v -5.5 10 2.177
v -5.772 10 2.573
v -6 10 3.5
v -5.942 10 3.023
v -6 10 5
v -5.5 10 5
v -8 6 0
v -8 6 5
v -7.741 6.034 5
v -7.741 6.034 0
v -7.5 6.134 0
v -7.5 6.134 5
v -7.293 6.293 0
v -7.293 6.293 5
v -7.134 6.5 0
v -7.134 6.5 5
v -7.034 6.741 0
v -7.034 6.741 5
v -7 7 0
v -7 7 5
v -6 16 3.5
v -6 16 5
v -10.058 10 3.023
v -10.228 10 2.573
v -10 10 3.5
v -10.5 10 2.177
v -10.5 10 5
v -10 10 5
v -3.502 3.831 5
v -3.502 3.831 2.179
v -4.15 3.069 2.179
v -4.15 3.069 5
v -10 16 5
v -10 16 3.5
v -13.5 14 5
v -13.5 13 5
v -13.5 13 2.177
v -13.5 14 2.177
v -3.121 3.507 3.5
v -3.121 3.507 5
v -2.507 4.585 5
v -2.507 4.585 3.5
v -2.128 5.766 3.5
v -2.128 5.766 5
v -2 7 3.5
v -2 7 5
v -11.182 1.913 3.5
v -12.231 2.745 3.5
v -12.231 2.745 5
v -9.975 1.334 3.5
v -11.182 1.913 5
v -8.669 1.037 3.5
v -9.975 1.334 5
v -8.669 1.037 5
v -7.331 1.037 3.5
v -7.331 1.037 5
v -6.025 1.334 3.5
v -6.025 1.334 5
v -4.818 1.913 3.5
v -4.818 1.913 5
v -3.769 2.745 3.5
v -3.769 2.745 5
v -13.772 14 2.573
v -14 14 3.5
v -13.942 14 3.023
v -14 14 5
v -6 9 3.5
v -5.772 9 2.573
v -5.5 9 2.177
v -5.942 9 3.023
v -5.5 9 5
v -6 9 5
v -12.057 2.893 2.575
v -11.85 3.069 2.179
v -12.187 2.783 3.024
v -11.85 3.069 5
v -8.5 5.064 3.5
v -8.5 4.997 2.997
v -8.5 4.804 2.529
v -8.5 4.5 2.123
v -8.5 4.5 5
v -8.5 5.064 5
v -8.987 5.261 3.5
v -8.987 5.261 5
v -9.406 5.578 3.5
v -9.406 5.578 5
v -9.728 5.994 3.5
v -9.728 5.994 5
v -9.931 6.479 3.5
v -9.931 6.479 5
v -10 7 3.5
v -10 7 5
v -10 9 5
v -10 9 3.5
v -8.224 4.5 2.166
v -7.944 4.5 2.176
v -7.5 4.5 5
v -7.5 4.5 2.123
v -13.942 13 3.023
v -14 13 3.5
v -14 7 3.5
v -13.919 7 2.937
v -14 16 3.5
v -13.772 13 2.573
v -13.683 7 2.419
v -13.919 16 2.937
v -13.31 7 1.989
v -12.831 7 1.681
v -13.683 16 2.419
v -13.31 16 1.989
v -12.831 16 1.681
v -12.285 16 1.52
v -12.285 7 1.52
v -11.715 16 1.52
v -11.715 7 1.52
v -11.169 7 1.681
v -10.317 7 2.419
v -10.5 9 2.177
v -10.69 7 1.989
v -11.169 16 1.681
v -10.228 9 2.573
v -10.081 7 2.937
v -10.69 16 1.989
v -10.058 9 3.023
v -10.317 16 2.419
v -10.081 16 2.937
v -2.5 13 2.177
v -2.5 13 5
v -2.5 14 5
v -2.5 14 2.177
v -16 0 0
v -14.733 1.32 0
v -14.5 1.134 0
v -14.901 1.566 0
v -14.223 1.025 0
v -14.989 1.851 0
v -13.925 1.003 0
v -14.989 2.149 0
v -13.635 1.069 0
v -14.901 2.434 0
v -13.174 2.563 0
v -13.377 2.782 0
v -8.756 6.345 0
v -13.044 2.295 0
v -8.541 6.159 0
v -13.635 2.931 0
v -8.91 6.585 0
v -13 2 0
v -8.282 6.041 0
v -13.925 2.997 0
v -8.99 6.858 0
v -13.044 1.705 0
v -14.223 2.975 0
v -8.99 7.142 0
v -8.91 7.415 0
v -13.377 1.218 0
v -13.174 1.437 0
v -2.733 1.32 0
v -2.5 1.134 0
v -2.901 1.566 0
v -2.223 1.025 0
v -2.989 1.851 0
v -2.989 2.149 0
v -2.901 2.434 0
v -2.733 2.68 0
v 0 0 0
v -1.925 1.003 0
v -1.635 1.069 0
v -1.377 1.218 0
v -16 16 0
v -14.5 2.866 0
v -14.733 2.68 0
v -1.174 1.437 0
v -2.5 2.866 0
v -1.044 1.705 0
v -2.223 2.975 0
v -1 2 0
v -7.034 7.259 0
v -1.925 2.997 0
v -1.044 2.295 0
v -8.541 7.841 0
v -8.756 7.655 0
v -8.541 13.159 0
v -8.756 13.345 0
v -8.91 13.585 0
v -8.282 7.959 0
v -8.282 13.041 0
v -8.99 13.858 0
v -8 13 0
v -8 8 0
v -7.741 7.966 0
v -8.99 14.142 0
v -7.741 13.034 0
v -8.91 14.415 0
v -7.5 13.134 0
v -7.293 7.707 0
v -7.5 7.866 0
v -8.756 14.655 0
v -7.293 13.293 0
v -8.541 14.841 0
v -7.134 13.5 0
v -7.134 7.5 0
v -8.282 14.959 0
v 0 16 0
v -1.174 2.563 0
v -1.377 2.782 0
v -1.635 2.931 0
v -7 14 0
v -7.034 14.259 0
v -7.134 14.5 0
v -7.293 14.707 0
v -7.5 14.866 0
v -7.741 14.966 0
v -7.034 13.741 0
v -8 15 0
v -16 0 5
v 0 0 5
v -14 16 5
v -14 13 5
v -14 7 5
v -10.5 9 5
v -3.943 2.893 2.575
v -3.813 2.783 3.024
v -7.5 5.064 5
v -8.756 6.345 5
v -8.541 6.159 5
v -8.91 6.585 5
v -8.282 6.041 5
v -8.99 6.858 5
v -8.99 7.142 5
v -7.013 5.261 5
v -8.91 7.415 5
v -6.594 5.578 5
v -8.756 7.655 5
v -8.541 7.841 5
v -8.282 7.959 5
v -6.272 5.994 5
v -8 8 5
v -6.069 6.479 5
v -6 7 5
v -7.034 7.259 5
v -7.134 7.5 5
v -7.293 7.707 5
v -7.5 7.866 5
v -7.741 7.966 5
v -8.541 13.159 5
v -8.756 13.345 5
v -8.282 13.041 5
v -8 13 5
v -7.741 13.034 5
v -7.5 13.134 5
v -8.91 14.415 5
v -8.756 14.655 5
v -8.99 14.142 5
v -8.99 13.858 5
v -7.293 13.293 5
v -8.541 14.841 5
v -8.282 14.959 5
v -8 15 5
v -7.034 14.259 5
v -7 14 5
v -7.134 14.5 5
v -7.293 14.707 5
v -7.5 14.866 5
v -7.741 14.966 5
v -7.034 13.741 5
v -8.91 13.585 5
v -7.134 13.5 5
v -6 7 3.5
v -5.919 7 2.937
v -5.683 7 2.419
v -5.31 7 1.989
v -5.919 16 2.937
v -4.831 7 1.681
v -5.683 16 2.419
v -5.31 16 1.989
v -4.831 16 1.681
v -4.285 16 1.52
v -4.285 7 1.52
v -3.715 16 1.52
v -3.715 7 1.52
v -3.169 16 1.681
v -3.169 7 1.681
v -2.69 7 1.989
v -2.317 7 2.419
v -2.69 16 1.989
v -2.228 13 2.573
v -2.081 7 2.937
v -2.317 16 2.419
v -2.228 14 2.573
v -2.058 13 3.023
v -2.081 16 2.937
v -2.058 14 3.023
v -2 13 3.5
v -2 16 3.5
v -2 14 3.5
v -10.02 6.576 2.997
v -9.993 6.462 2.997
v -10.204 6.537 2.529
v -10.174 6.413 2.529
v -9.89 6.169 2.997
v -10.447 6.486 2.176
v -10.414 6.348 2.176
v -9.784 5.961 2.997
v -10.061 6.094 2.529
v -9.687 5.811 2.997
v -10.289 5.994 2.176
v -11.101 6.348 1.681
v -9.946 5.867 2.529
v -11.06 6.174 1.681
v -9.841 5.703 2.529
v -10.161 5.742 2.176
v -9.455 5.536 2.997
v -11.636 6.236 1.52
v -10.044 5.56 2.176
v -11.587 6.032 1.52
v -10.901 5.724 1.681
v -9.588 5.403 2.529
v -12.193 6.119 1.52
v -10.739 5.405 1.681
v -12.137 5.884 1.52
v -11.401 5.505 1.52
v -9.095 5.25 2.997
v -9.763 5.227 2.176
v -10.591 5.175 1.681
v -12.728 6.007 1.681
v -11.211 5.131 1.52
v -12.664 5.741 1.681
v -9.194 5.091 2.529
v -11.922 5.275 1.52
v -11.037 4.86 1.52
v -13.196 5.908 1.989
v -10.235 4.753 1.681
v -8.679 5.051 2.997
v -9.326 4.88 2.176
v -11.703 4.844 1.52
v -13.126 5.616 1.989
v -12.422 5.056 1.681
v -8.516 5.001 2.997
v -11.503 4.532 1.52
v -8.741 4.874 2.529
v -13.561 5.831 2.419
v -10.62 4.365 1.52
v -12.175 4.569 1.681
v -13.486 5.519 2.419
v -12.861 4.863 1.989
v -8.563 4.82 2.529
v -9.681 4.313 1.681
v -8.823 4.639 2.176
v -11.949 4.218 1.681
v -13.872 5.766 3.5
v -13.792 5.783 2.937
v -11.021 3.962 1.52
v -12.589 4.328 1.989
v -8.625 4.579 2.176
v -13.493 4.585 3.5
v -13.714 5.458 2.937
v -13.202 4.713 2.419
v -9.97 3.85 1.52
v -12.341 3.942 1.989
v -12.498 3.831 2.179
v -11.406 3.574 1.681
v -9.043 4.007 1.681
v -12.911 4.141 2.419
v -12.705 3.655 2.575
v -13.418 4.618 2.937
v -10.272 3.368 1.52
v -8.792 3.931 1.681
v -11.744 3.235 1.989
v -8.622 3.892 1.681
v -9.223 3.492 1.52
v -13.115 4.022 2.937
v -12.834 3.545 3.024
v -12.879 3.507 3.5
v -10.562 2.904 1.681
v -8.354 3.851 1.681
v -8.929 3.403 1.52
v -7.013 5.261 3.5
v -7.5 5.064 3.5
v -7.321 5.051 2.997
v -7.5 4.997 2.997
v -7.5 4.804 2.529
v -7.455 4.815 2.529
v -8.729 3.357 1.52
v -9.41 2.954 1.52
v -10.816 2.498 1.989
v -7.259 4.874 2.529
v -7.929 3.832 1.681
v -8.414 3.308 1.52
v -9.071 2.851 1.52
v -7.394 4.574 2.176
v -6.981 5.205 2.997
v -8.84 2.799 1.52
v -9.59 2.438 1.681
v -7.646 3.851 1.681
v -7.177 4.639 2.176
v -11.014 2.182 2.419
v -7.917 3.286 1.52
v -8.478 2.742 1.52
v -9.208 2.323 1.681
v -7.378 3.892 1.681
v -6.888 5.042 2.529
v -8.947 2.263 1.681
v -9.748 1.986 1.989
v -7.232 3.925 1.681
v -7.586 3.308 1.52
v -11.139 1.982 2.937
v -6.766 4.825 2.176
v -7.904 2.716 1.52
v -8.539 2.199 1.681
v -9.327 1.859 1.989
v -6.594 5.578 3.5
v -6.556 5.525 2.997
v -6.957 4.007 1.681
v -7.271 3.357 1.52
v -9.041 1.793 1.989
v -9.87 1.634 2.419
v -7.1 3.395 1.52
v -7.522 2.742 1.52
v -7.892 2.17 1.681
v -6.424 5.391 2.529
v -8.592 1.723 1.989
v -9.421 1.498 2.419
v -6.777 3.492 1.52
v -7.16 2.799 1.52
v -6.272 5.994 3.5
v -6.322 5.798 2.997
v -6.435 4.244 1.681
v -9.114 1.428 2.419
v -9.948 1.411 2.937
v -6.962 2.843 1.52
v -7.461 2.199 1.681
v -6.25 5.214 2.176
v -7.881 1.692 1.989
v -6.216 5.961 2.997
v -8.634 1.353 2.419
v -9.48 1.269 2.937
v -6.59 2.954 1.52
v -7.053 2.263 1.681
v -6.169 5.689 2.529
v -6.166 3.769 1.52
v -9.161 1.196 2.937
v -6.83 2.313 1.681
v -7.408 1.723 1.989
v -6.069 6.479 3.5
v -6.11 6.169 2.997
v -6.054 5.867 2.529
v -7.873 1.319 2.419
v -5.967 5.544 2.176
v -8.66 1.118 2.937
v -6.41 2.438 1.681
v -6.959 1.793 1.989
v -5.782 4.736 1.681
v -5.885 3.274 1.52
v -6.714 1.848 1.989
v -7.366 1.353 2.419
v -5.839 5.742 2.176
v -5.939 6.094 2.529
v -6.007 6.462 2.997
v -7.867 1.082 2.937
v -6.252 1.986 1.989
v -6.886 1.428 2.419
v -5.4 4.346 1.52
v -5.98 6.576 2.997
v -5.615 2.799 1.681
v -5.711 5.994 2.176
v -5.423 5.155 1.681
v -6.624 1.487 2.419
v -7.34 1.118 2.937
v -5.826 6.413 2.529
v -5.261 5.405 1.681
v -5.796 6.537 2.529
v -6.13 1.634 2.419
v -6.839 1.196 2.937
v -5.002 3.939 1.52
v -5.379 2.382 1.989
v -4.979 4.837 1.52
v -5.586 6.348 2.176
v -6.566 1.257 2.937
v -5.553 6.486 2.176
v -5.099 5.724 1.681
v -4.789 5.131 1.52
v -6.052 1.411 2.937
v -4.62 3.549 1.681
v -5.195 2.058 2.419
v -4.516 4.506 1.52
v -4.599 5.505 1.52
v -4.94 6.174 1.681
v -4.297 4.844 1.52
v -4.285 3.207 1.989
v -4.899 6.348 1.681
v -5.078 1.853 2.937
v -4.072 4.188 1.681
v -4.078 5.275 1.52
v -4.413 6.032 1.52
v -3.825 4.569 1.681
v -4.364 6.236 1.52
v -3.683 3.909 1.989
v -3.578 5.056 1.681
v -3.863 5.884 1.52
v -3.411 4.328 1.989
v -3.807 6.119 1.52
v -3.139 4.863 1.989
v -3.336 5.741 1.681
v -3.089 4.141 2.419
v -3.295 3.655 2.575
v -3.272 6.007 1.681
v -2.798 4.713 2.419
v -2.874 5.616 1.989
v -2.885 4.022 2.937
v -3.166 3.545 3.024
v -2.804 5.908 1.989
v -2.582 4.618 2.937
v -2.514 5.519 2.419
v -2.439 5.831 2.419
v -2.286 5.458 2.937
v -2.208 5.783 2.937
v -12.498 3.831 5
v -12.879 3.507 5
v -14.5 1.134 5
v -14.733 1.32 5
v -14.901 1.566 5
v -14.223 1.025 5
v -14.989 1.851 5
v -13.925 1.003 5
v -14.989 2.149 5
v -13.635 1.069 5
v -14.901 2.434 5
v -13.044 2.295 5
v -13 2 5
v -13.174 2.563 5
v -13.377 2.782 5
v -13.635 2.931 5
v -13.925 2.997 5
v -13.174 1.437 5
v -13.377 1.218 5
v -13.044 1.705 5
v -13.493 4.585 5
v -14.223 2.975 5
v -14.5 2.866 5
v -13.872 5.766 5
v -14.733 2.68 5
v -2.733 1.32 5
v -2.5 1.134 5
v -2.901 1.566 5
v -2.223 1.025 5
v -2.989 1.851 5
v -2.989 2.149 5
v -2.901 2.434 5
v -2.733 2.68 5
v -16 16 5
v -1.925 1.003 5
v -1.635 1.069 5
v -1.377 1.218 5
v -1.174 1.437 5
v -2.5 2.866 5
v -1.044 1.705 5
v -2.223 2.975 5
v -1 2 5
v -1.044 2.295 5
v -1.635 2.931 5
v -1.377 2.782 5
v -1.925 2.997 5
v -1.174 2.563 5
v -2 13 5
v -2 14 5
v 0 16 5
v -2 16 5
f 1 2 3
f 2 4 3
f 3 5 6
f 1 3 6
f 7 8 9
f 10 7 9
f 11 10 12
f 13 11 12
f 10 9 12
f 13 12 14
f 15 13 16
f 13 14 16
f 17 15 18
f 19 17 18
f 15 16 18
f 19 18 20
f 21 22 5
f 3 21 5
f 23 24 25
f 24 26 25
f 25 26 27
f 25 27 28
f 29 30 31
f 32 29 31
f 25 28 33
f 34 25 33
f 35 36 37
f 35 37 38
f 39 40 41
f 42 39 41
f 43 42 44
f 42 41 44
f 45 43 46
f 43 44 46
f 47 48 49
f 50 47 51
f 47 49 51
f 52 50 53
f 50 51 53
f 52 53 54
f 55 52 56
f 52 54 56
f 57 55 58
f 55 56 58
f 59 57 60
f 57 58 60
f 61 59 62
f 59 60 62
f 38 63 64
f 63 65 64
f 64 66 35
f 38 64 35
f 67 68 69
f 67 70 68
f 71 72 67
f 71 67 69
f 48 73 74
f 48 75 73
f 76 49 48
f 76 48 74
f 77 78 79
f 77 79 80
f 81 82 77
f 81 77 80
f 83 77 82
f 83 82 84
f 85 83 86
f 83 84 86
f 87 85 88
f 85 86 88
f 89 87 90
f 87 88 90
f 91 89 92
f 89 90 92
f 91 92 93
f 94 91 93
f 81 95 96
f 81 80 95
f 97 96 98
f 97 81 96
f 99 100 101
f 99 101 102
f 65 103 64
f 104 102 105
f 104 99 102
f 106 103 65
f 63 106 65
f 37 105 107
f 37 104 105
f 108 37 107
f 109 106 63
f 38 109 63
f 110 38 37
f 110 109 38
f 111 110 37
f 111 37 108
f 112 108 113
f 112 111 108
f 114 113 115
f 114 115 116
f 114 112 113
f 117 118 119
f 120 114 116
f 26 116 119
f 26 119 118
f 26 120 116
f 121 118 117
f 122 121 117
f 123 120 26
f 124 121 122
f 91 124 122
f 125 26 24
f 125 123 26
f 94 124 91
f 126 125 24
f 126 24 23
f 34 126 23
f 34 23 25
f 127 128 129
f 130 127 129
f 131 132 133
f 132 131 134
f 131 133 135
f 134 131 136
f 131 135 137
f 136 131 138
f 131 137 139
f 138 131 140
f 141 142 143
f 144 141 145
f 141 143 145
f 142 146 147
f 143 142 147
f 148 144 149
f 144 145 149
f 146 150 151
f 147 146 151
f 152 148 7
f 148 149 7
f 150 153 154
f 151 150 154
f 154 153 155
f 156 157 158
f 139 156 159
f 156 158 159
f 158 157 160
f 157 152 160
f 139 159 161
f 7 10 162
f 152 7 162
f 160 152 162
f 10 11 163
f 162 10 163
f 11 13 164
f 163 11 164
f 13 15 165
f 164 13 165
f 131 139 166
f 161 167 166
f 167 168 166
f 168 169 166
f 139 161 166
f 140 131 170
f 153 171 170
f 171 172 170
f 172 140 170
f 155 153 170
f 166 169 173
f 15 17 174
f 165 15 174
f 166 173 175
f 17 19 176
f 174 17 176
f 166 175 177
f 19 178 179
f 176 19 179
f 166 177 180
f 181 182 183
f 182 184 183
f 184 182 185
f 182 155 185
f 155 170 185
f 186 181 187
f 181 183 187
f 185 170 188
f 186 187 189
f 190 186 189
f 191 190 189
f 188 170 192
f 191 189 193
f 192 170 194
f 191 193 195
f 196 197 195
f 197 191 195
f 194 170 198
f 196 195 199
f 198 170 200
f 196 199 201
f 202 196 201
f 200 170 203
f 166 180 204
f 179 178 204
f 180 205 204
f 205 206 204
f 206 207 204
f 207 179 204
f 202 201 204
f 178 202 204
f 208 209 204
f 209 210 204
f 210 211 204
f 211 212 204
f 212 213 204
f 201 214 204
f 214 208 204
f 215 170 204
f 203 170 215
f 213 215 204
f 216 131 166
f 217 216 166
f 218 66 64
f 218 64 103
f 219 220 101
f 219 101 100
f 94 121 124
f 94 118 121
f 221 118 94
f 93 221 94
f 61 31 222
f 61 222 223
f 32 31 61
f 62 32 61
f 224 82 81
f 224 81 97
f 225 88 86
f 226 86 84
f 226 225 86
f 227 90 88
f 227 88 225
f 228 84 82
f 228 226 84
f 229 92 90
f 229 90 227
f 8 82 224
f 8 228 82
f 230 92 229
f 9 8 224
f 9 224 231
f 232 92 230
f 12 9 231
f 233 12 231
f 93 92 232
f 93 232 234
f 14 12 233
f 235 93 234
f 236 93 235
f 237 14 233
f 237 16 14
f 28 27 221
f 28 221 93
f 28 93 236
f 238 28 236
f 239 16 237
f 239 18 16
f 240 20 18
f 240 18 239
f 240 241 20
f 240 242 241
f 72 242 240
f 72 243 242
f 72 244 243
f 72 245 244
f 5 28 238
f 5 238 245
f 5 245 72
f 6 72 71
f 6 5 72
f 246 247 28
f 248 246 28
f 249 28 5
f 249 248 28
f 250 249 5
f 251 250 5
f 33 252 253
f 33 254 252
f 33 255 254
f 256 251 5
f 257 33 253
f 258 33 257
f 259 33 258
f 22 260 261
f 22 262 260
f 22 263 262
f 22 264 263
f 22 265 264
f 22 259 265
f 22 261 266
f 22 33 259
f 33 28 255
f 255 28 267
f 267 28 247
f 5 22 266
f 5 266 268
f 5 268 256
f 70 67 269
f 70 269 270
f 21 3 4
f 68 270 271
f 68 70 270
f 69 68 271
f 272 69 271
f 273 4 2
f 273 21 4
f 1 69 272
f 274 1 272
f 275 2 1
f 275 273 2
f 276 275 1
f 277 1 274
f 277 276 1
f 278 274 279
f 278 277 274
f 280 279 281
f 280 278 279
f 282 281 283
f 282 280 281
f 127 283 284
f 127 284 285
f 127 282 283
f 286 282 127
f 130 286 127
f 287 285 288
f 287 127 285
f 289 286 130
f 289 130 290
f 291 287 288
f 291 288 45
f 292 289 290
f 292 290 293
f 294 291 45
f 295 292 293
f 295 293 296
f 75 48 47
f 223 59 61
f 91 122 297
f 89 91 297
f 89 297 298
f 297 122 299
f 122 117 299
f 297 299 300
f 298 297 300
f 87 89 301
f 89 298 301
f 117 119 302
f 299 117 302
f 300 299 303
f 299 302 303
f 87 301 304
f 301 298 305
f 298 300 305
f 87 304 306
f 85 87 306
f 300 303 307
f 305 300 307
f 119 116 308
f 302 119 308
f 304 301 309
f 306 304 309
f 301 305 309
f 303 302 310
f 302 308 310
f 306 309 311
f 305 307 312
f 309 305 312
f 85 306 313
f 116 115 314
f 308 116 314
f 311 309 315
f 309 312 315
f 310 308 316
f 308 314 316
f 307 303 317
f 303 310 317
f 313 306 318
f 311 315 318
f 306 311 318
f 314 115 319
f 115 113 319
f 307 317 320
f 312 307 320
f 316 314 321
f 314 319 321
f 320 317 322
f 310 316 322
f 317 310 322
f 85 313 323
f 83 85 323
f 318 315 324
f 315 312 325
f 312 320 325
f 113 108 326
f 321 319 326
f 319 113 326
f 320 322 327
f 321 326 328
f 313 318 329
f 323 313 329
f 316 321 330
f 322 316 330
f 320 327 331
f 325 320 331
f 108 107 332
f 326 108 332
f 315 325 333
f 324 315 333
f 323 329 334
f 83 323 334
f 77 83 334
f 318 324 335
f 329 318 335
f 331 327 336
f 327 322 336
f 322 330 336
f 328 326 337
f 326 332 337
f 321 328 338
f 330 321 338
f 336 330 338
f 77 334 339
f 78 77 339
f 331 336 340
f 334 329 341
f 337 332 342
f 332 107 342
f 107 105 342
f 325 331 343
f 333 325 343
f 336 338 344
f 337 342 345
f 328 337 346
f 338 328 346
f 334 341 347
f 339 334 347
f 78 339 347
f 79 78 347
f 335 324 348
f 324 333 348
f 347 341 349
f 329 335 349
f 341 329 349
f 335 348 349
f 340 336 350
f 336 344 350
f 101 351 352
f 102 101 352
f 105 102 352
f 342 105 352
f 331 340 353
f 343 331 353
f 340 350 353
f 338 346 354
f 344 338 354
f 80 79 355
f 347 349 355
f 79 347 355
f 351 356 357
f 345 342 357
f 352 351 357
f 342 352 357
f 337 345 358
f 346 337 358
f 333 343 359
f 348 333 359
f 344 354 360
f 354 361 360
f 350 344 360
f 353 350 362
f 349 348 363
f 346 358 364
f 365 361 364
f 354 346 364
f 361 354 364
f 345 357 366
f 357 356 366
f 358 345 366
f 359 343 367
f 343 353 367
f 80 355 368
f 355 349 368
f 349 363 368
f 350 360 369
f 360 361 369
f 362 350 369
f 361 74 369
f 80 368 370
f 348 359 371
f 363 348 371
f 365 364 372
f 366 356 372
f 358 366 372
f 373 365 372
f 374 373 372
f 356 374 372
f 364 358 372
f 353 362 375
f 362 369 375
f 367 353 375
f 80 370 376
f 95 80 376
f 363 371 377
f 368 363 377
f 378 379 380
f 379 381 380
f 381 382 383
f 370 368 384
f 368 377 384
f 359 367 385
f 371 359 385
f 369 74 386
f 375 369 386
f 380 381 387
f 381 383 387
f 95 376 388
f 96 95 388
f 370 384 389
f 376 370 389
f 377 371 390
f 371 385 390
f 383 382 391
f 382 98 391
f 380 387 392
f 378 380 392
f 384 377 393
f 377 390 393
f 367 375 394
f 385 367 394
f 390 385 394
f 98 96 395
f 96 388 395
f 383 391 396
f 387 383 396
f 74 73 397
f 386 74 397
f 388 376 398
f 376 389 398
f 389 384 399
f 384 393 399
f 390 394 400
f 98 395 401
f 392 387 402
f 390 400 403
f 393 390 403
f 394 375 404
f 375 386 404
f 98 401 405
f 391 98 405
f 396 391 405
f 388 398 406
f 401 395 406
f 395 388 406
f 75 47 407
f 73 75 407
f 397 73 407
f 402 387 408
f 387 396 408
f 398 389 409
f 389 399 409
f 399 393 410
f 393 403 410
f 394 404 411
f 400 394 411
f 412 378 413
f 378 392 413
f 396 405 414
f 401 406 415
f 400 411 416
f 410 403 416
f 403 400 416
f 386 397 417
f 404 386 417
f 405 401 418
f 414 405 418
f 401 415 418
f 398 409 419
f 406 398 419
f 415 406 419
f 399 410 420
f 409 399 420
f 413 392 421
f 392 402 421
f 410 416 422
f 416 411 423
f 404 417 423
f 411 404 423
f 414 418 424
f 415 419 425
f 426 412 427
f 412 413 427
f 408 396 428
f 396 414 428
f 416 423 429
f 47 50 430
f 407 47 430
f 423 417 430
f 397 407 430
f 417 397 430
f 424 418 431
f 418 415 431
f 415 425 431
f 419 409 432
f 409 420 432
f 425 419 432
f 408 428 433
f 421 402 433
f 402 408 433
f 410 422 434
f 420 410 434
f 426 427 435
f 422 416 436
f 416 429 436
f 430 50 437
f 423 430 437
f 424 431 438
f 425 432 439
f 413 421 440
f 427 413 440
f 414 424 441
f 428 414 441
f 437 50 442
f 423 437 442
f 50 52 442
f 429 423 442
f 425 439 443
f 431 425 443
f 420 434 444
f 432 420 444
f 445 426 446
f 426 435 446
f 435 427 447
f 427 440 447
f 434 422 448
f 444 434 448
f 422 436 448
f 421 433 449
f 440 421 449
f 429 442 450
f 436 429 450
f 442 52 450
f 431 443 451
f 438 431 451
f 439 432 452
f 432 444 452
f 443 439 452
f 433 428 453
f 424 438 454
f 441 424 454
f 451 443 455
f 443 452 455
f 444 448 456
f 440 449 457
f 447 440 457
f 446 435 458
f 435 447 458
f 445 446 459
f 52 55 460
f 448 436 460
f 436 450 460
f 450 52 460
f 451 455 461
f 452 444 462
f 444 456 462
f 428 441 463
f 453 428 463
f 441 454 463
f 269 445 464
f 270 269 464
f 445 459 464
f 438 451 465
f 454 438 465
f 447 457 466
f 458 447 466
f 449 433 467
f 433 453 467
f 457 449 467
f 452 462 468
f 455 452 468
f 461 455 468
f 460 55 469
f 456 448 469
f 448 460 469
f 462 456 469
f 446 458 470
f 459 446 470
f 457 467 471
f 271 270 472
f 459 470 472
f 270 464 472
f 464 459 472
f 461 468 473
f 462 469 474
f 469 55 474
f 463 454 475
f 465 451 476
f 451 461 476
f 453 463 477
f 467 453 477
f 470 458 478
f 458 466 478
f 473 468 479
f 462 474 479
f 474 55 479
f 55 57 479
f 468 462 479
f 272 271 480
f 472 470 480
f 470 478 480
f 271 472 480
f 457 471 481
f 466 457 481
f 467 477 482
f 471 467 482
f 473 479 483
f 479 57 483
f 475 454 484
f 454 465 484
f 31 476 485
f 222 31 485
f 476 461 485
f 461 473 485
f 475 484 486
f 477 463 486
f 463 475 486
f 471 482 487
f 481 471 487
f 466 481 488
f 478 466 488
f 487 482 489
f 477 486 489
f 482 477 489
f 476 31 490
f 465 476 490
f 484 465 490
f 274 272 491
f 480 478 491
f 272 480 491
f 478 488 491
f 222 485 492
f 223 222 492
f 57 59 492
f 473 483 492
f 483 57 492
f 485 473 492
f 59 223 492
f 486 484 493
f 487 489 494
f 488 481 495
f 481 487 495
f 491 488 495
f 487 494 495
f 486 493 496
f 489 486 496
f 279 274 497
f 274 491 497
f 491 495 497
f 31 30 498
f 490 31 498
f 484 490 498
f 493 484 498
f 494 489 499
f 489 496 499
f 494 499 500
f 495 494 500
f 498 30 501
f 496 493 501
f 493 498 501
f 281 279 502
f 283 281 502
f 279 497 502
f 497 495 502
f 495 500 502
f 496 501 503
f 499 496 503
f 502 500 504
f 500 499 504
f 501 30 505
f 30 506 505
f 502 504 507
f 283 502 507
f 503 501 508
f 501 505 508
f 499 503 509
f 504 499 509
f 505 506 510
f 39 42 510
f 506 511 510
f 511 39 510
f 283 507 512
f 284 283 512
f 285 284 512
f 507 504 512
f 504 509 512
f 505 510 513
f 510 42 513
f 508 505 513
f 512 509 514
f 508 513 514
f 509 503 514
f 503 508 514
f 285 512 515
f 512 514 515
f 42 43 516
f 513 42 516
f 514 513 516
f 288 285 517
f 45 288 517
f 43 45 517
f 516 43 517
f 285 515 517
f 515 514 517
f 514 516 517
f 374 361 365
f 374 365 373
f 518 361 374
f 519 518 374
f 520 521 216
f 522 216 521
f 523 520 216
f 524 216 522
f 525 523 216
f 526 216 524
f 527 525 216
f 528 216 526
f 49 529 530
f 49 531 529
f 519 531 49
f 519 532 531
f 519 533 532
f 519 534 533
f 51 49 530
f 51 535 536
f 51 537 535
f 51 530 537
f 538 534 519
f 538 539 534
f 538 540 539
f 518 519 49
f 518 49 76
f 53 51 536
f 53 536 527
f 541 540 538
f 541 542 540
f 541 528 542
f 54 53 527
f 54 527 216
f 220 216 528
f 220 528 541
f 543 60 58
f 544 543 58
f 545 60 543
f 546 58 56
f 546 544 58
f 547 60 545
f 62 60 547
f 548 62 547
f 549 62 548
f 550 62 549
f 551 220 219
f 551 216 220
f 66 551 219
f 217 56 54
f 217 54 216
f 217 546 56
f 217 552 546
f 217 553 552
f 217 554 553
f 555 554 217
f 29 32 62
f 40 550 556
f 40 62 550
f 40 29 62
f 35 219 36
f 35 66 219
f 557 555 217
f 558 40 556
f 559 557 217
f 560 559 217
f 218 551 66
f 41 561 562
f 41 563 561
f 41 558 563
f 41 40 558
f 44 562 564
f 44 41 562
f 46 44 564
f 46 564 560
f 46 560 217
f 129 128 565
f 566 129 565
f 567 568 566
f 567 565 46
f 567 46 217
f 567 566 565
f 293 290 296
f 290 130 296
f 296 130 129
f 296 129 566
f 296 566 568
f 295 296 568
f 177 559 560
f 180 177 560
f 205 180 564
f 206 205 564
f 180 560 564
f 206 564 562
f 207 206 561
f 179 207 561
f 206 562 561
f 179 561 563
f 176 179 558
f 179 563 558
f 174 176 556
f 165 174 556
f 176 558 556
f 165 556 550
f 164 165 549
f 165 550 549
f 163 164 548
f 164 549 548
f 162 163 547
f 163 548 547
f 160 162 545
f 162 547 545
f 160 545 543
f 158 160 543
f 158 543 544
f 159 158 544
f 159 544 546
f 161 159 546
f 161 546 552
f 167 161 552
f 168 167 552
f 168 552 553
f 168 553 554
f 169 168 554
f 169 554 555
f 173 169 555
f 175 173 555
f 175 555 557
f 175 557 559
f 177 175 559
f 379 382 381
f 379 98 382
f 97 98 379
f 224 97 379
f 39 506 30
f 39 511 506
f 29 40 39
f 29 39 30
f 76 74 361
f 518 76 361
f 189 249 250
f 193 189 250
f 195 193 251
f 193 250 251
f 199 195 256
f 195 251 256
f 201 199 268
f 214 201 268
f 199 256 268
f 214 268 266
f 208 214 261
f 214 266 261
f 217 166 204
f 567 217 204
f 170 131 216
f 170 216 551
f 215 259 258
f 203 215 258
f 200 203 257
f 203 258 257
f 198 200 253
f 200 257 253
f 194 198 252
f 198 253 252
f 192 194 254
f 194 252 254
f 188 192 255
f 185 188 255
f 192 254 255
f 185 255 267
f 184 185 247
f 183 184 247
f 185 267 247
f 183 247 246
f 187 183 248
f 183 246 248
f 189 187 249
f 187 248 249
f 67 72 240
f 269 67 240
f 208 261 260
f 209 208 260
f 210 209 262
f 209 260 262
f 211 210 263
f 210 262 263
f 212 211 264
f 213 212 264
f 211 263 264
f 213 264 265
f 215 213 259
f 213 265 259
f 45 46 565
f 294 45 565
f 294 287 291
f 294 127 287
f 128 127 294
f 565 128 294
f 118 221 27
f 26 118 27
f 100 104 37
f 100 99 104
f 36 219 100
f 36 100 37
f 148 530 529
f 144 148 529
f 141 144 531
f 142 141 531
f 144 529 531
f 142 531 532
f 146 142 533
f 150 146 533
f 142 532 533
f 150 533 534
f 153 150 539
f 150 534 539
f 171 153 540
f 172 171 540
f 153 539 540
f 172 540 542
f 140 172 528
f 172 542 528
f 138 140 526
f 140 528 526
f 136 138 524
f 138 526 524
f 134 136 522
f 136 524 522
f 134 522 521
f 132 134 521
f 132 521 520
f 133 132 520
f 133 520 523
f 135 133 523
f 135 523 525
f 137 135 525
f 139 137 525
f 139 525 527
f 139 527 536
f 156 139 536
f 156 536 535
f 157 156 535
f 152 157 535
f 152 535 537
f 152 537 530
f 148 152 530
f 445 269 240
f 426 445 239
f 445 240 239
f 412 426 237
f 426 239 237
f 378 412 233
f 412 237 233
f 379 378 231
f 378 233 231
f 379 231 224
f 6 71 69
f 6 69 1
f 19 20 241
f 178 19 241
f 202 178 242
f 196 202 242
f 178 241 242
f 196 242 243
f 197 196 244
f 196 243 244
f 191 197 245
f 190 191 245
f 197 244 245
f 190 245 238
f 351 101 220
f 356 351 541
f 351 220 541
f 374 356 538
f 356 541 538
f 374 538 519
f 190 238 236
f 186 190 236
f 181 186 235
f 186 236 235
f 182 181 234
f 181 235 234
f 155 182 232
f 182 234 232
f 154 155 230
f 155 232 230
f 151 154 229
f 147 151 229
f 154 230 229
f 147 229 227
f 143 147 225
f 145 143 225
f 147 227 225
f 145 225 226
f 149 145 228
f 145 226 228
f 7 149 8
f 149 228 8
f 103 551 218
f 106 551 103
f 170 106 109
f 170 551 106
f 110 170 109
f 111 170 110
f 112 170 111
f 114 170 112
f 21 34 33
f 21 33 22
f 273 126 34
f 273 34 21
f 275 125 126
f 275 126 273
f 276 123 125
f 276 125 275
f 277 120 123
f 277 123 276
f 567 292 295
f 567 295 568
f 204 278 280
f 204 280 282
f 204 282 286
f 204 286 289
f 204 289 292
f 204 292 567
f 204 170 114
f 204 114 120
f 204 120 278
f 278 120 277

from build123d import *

# Parameters (mm, degrees)
F0_W      = 16
F0_H      = 16
F1_DEPTH  = 5
F2_W      = 2
F2_H      = 9
F3_DEPTH  = 1.5
F4_W      = 2
F4_H      = 9
F8_W      = 0.5
F8_H      = 1
F8_H_2    = 0.5
F9_DEPTH  = 5
F10_R     = 1
F11_DEPTH = 25


# Not quite as in the source:
# - a feature names something its author has since deleted; it is built from what else it names


with BuildPart() as f1:
    # F0 (on Top) → F1 (new body)
    with BuildSketch(Plane.XY):
        with Locations((-8, 8)):
            Rectangle(F0_W, F0_H)
    extrude(amount=F1_DEPTH)

    # F2 (on face) → F3 (cut)
    with BuildSketch(Plane.XY.offset(5)):
        with Locations((-13, 11.5)):
            Rectangle(F2_W, F2_H)
        with BuildLine():
            Line((-12, 7), (-14, 7))
            ThreePointArc((-14, 7), (-8, 1), (-2, 7))
            Line((-2, 7), (-4, 7))
            ThreePointArc((-4, 7), (-8, 3), (-12, 7))
        make_face()
        with BuildLine():
            Line((-10, 16), (-12, 16))
            Line((-12, 16), (-12, 7))
            ThreePointArc((-12, 7), (-8, 3), (-4, 7))
            Line((-4, 7), (-4, 16))
            Line((-4, 16), (-6, 16))
            Line((-6, 16), (-6, 7))
            ThreePointArc((-6, 7), (-8, 5), (-10, 7))
            Line((-10, 7), (-10, 16))
        make_face()
        with Locations((-3, 11.5)):
            Rectangle(F2_W, F2_H)
    extrude(amount=-F3_DEPTH, mode=Mode.SUBTRACT)

    # F4 (on face) → F5 (revolve, cut)
    with BuildSketch(Plane.XY.offset(3.5)):
        with Locations((-13, 11.5)):
            Rectangle(F4_W, F4_H)
    revolve(axis=Axis((-12, 11.5, 3.5), (0, -1, 0)), mode=Mode.SUBTRACT)

    # F6: sweep along a path in F6_path
    with BuildLine(Plane(origin=(-10, 7, 3.5), x_dir=(0, -1, 0), z_dir=(0, 0, -1))) as f6_path:
        ThreePointArc((0, 0), (2, -2), (0, -4))
    # F5_face (on face) → F6 (sweep, cut)
    with BuildSketch(Plane(origin=(-12, 7, 2.6511736368), x_dir=(-1, 0, 0), z_dir=(0, 1, 0))):
        with BuildLine():
            Line((2, 0.8488263632), (-2, 0.8488263632))
            ThreePointArc((-2, 0.8488263632), (0, -1.1511736368), (2, 0.8488263632))
        make_face()
    sweep(path=f6_path.line, mode=Mode.SUBTRACT)

    # F4 (on face) → F7 (revolve, cut)
    with BuildSketch(Plane.XY.offset(3.5)):
        with Locations((-3, 11.5)):
            Rectangle(F4_W, F4_H)
    revolve(axis=Axis((-4, 11.5, 3.5), (0, -1, 0)), mode=Mode.SUBTRACT)

    # F8 (on face) → F9 (join)
    with BuildSketch(Plane.XY.offset(5)):
        with Locations((-13.75, 13.5)):
            Rectangle(F8_W, F8_H)
        with Locations((-10.25, 9.5)):
            Rectangle(F8_W, F8_H)
        with Locations((-5.75, 9.5)):
            Rectangle(F8_W, F8_H)
        with Locations((-2.25, 13.5)):
            Rectangle(F8_W, F8_H)
        with BuildLine():
            Line((-12.4976444751, 3.8310784478), (-12.8785175711, 3.5071406687))
            ThreePointArc((-12.8785175711, 3.5071406687), (-12.570477152, 3.1127466505), (-12.2306420128, 2.7453944767))
            Line((-12.2306420128, 2.7453944767), (-11.8497689168, 3.0693322558))
            Line((-11.8497689168, 3.0693322558), (-12.4976444751, 3.8310784478))
        make_face()
        with BuildLine():
            ThreePointArc((-3.7693579872, 2.7453944767), (-3.429522848, 3.1127466505), (-3.1214824289, 3.5071406687))
            Line((-3.1214824289, 3.5071406687), (-3.5023555249, 3.8310784478))
            Line((-3.5023555249, 3.8310784478), (-4.1502310832, 3.0693322558))
            Line((-4.1502310832, 3.0693322558), (-3.7693579872, 2.7453944767))
        make_face()
        with Locations((-8.25, 4.75)):
            Rectangle(F8_W, F8_H_2)
        with Locations((-7.75, 4.75)):
            Rectangle(F8_W, F8_H_2)
        with Locations((-8.25, 5.25)):
            Rectangle(F8_W, F8_H_2)
        with Locations((-7.75, 5.25)):
            Rectangle(F8_W, F8_H_2)
    extrude(amount=-F9_DEPTH)

    # F10 (on face) → F11 (cut)
    with BuildSketch(Plane.XY.offset(5)):
        with BuildLine():
            ThreePointArc((-7, 14), (-7.2928932188, 14.7071067812), (-8, 15))
            Line((-8, 15), (-8, 13))
            ThreePointArc((-8, 13), (-7.2928932188, 13.2928932188), (-7, 14))
        make_face()
        with BuildLine():
            Line((-8, 13), (-8, 15))
            ThreePointArc((-8, 15), (-9, 14), (-8, 13))
        make_face()
        with BuildLine():
            Line((-8, 8), (-8, 6))
            ThreePointArc((-8, 6), (-7.2928932188, 6.2928932188), (-7, 7))
            ThreePointArc((-7, 7), (-7.2928932188, 7.7071067812), (-8, 8))
        make_face()
        with BuildLine():
            ThreePointArc((-8, 8), (-9, 7), (-8, 6))
            Line((-8, 6), (-8, 8))
        make_face()
        with Locations((-14, 2)):
            Circle(F10_R)
        with Locations((-2, 2)):
            Circle(F10_R)
    extrude(amount=-F11_DEPTH, mode=Mode.SUBTRACT)


solid = f1.part
